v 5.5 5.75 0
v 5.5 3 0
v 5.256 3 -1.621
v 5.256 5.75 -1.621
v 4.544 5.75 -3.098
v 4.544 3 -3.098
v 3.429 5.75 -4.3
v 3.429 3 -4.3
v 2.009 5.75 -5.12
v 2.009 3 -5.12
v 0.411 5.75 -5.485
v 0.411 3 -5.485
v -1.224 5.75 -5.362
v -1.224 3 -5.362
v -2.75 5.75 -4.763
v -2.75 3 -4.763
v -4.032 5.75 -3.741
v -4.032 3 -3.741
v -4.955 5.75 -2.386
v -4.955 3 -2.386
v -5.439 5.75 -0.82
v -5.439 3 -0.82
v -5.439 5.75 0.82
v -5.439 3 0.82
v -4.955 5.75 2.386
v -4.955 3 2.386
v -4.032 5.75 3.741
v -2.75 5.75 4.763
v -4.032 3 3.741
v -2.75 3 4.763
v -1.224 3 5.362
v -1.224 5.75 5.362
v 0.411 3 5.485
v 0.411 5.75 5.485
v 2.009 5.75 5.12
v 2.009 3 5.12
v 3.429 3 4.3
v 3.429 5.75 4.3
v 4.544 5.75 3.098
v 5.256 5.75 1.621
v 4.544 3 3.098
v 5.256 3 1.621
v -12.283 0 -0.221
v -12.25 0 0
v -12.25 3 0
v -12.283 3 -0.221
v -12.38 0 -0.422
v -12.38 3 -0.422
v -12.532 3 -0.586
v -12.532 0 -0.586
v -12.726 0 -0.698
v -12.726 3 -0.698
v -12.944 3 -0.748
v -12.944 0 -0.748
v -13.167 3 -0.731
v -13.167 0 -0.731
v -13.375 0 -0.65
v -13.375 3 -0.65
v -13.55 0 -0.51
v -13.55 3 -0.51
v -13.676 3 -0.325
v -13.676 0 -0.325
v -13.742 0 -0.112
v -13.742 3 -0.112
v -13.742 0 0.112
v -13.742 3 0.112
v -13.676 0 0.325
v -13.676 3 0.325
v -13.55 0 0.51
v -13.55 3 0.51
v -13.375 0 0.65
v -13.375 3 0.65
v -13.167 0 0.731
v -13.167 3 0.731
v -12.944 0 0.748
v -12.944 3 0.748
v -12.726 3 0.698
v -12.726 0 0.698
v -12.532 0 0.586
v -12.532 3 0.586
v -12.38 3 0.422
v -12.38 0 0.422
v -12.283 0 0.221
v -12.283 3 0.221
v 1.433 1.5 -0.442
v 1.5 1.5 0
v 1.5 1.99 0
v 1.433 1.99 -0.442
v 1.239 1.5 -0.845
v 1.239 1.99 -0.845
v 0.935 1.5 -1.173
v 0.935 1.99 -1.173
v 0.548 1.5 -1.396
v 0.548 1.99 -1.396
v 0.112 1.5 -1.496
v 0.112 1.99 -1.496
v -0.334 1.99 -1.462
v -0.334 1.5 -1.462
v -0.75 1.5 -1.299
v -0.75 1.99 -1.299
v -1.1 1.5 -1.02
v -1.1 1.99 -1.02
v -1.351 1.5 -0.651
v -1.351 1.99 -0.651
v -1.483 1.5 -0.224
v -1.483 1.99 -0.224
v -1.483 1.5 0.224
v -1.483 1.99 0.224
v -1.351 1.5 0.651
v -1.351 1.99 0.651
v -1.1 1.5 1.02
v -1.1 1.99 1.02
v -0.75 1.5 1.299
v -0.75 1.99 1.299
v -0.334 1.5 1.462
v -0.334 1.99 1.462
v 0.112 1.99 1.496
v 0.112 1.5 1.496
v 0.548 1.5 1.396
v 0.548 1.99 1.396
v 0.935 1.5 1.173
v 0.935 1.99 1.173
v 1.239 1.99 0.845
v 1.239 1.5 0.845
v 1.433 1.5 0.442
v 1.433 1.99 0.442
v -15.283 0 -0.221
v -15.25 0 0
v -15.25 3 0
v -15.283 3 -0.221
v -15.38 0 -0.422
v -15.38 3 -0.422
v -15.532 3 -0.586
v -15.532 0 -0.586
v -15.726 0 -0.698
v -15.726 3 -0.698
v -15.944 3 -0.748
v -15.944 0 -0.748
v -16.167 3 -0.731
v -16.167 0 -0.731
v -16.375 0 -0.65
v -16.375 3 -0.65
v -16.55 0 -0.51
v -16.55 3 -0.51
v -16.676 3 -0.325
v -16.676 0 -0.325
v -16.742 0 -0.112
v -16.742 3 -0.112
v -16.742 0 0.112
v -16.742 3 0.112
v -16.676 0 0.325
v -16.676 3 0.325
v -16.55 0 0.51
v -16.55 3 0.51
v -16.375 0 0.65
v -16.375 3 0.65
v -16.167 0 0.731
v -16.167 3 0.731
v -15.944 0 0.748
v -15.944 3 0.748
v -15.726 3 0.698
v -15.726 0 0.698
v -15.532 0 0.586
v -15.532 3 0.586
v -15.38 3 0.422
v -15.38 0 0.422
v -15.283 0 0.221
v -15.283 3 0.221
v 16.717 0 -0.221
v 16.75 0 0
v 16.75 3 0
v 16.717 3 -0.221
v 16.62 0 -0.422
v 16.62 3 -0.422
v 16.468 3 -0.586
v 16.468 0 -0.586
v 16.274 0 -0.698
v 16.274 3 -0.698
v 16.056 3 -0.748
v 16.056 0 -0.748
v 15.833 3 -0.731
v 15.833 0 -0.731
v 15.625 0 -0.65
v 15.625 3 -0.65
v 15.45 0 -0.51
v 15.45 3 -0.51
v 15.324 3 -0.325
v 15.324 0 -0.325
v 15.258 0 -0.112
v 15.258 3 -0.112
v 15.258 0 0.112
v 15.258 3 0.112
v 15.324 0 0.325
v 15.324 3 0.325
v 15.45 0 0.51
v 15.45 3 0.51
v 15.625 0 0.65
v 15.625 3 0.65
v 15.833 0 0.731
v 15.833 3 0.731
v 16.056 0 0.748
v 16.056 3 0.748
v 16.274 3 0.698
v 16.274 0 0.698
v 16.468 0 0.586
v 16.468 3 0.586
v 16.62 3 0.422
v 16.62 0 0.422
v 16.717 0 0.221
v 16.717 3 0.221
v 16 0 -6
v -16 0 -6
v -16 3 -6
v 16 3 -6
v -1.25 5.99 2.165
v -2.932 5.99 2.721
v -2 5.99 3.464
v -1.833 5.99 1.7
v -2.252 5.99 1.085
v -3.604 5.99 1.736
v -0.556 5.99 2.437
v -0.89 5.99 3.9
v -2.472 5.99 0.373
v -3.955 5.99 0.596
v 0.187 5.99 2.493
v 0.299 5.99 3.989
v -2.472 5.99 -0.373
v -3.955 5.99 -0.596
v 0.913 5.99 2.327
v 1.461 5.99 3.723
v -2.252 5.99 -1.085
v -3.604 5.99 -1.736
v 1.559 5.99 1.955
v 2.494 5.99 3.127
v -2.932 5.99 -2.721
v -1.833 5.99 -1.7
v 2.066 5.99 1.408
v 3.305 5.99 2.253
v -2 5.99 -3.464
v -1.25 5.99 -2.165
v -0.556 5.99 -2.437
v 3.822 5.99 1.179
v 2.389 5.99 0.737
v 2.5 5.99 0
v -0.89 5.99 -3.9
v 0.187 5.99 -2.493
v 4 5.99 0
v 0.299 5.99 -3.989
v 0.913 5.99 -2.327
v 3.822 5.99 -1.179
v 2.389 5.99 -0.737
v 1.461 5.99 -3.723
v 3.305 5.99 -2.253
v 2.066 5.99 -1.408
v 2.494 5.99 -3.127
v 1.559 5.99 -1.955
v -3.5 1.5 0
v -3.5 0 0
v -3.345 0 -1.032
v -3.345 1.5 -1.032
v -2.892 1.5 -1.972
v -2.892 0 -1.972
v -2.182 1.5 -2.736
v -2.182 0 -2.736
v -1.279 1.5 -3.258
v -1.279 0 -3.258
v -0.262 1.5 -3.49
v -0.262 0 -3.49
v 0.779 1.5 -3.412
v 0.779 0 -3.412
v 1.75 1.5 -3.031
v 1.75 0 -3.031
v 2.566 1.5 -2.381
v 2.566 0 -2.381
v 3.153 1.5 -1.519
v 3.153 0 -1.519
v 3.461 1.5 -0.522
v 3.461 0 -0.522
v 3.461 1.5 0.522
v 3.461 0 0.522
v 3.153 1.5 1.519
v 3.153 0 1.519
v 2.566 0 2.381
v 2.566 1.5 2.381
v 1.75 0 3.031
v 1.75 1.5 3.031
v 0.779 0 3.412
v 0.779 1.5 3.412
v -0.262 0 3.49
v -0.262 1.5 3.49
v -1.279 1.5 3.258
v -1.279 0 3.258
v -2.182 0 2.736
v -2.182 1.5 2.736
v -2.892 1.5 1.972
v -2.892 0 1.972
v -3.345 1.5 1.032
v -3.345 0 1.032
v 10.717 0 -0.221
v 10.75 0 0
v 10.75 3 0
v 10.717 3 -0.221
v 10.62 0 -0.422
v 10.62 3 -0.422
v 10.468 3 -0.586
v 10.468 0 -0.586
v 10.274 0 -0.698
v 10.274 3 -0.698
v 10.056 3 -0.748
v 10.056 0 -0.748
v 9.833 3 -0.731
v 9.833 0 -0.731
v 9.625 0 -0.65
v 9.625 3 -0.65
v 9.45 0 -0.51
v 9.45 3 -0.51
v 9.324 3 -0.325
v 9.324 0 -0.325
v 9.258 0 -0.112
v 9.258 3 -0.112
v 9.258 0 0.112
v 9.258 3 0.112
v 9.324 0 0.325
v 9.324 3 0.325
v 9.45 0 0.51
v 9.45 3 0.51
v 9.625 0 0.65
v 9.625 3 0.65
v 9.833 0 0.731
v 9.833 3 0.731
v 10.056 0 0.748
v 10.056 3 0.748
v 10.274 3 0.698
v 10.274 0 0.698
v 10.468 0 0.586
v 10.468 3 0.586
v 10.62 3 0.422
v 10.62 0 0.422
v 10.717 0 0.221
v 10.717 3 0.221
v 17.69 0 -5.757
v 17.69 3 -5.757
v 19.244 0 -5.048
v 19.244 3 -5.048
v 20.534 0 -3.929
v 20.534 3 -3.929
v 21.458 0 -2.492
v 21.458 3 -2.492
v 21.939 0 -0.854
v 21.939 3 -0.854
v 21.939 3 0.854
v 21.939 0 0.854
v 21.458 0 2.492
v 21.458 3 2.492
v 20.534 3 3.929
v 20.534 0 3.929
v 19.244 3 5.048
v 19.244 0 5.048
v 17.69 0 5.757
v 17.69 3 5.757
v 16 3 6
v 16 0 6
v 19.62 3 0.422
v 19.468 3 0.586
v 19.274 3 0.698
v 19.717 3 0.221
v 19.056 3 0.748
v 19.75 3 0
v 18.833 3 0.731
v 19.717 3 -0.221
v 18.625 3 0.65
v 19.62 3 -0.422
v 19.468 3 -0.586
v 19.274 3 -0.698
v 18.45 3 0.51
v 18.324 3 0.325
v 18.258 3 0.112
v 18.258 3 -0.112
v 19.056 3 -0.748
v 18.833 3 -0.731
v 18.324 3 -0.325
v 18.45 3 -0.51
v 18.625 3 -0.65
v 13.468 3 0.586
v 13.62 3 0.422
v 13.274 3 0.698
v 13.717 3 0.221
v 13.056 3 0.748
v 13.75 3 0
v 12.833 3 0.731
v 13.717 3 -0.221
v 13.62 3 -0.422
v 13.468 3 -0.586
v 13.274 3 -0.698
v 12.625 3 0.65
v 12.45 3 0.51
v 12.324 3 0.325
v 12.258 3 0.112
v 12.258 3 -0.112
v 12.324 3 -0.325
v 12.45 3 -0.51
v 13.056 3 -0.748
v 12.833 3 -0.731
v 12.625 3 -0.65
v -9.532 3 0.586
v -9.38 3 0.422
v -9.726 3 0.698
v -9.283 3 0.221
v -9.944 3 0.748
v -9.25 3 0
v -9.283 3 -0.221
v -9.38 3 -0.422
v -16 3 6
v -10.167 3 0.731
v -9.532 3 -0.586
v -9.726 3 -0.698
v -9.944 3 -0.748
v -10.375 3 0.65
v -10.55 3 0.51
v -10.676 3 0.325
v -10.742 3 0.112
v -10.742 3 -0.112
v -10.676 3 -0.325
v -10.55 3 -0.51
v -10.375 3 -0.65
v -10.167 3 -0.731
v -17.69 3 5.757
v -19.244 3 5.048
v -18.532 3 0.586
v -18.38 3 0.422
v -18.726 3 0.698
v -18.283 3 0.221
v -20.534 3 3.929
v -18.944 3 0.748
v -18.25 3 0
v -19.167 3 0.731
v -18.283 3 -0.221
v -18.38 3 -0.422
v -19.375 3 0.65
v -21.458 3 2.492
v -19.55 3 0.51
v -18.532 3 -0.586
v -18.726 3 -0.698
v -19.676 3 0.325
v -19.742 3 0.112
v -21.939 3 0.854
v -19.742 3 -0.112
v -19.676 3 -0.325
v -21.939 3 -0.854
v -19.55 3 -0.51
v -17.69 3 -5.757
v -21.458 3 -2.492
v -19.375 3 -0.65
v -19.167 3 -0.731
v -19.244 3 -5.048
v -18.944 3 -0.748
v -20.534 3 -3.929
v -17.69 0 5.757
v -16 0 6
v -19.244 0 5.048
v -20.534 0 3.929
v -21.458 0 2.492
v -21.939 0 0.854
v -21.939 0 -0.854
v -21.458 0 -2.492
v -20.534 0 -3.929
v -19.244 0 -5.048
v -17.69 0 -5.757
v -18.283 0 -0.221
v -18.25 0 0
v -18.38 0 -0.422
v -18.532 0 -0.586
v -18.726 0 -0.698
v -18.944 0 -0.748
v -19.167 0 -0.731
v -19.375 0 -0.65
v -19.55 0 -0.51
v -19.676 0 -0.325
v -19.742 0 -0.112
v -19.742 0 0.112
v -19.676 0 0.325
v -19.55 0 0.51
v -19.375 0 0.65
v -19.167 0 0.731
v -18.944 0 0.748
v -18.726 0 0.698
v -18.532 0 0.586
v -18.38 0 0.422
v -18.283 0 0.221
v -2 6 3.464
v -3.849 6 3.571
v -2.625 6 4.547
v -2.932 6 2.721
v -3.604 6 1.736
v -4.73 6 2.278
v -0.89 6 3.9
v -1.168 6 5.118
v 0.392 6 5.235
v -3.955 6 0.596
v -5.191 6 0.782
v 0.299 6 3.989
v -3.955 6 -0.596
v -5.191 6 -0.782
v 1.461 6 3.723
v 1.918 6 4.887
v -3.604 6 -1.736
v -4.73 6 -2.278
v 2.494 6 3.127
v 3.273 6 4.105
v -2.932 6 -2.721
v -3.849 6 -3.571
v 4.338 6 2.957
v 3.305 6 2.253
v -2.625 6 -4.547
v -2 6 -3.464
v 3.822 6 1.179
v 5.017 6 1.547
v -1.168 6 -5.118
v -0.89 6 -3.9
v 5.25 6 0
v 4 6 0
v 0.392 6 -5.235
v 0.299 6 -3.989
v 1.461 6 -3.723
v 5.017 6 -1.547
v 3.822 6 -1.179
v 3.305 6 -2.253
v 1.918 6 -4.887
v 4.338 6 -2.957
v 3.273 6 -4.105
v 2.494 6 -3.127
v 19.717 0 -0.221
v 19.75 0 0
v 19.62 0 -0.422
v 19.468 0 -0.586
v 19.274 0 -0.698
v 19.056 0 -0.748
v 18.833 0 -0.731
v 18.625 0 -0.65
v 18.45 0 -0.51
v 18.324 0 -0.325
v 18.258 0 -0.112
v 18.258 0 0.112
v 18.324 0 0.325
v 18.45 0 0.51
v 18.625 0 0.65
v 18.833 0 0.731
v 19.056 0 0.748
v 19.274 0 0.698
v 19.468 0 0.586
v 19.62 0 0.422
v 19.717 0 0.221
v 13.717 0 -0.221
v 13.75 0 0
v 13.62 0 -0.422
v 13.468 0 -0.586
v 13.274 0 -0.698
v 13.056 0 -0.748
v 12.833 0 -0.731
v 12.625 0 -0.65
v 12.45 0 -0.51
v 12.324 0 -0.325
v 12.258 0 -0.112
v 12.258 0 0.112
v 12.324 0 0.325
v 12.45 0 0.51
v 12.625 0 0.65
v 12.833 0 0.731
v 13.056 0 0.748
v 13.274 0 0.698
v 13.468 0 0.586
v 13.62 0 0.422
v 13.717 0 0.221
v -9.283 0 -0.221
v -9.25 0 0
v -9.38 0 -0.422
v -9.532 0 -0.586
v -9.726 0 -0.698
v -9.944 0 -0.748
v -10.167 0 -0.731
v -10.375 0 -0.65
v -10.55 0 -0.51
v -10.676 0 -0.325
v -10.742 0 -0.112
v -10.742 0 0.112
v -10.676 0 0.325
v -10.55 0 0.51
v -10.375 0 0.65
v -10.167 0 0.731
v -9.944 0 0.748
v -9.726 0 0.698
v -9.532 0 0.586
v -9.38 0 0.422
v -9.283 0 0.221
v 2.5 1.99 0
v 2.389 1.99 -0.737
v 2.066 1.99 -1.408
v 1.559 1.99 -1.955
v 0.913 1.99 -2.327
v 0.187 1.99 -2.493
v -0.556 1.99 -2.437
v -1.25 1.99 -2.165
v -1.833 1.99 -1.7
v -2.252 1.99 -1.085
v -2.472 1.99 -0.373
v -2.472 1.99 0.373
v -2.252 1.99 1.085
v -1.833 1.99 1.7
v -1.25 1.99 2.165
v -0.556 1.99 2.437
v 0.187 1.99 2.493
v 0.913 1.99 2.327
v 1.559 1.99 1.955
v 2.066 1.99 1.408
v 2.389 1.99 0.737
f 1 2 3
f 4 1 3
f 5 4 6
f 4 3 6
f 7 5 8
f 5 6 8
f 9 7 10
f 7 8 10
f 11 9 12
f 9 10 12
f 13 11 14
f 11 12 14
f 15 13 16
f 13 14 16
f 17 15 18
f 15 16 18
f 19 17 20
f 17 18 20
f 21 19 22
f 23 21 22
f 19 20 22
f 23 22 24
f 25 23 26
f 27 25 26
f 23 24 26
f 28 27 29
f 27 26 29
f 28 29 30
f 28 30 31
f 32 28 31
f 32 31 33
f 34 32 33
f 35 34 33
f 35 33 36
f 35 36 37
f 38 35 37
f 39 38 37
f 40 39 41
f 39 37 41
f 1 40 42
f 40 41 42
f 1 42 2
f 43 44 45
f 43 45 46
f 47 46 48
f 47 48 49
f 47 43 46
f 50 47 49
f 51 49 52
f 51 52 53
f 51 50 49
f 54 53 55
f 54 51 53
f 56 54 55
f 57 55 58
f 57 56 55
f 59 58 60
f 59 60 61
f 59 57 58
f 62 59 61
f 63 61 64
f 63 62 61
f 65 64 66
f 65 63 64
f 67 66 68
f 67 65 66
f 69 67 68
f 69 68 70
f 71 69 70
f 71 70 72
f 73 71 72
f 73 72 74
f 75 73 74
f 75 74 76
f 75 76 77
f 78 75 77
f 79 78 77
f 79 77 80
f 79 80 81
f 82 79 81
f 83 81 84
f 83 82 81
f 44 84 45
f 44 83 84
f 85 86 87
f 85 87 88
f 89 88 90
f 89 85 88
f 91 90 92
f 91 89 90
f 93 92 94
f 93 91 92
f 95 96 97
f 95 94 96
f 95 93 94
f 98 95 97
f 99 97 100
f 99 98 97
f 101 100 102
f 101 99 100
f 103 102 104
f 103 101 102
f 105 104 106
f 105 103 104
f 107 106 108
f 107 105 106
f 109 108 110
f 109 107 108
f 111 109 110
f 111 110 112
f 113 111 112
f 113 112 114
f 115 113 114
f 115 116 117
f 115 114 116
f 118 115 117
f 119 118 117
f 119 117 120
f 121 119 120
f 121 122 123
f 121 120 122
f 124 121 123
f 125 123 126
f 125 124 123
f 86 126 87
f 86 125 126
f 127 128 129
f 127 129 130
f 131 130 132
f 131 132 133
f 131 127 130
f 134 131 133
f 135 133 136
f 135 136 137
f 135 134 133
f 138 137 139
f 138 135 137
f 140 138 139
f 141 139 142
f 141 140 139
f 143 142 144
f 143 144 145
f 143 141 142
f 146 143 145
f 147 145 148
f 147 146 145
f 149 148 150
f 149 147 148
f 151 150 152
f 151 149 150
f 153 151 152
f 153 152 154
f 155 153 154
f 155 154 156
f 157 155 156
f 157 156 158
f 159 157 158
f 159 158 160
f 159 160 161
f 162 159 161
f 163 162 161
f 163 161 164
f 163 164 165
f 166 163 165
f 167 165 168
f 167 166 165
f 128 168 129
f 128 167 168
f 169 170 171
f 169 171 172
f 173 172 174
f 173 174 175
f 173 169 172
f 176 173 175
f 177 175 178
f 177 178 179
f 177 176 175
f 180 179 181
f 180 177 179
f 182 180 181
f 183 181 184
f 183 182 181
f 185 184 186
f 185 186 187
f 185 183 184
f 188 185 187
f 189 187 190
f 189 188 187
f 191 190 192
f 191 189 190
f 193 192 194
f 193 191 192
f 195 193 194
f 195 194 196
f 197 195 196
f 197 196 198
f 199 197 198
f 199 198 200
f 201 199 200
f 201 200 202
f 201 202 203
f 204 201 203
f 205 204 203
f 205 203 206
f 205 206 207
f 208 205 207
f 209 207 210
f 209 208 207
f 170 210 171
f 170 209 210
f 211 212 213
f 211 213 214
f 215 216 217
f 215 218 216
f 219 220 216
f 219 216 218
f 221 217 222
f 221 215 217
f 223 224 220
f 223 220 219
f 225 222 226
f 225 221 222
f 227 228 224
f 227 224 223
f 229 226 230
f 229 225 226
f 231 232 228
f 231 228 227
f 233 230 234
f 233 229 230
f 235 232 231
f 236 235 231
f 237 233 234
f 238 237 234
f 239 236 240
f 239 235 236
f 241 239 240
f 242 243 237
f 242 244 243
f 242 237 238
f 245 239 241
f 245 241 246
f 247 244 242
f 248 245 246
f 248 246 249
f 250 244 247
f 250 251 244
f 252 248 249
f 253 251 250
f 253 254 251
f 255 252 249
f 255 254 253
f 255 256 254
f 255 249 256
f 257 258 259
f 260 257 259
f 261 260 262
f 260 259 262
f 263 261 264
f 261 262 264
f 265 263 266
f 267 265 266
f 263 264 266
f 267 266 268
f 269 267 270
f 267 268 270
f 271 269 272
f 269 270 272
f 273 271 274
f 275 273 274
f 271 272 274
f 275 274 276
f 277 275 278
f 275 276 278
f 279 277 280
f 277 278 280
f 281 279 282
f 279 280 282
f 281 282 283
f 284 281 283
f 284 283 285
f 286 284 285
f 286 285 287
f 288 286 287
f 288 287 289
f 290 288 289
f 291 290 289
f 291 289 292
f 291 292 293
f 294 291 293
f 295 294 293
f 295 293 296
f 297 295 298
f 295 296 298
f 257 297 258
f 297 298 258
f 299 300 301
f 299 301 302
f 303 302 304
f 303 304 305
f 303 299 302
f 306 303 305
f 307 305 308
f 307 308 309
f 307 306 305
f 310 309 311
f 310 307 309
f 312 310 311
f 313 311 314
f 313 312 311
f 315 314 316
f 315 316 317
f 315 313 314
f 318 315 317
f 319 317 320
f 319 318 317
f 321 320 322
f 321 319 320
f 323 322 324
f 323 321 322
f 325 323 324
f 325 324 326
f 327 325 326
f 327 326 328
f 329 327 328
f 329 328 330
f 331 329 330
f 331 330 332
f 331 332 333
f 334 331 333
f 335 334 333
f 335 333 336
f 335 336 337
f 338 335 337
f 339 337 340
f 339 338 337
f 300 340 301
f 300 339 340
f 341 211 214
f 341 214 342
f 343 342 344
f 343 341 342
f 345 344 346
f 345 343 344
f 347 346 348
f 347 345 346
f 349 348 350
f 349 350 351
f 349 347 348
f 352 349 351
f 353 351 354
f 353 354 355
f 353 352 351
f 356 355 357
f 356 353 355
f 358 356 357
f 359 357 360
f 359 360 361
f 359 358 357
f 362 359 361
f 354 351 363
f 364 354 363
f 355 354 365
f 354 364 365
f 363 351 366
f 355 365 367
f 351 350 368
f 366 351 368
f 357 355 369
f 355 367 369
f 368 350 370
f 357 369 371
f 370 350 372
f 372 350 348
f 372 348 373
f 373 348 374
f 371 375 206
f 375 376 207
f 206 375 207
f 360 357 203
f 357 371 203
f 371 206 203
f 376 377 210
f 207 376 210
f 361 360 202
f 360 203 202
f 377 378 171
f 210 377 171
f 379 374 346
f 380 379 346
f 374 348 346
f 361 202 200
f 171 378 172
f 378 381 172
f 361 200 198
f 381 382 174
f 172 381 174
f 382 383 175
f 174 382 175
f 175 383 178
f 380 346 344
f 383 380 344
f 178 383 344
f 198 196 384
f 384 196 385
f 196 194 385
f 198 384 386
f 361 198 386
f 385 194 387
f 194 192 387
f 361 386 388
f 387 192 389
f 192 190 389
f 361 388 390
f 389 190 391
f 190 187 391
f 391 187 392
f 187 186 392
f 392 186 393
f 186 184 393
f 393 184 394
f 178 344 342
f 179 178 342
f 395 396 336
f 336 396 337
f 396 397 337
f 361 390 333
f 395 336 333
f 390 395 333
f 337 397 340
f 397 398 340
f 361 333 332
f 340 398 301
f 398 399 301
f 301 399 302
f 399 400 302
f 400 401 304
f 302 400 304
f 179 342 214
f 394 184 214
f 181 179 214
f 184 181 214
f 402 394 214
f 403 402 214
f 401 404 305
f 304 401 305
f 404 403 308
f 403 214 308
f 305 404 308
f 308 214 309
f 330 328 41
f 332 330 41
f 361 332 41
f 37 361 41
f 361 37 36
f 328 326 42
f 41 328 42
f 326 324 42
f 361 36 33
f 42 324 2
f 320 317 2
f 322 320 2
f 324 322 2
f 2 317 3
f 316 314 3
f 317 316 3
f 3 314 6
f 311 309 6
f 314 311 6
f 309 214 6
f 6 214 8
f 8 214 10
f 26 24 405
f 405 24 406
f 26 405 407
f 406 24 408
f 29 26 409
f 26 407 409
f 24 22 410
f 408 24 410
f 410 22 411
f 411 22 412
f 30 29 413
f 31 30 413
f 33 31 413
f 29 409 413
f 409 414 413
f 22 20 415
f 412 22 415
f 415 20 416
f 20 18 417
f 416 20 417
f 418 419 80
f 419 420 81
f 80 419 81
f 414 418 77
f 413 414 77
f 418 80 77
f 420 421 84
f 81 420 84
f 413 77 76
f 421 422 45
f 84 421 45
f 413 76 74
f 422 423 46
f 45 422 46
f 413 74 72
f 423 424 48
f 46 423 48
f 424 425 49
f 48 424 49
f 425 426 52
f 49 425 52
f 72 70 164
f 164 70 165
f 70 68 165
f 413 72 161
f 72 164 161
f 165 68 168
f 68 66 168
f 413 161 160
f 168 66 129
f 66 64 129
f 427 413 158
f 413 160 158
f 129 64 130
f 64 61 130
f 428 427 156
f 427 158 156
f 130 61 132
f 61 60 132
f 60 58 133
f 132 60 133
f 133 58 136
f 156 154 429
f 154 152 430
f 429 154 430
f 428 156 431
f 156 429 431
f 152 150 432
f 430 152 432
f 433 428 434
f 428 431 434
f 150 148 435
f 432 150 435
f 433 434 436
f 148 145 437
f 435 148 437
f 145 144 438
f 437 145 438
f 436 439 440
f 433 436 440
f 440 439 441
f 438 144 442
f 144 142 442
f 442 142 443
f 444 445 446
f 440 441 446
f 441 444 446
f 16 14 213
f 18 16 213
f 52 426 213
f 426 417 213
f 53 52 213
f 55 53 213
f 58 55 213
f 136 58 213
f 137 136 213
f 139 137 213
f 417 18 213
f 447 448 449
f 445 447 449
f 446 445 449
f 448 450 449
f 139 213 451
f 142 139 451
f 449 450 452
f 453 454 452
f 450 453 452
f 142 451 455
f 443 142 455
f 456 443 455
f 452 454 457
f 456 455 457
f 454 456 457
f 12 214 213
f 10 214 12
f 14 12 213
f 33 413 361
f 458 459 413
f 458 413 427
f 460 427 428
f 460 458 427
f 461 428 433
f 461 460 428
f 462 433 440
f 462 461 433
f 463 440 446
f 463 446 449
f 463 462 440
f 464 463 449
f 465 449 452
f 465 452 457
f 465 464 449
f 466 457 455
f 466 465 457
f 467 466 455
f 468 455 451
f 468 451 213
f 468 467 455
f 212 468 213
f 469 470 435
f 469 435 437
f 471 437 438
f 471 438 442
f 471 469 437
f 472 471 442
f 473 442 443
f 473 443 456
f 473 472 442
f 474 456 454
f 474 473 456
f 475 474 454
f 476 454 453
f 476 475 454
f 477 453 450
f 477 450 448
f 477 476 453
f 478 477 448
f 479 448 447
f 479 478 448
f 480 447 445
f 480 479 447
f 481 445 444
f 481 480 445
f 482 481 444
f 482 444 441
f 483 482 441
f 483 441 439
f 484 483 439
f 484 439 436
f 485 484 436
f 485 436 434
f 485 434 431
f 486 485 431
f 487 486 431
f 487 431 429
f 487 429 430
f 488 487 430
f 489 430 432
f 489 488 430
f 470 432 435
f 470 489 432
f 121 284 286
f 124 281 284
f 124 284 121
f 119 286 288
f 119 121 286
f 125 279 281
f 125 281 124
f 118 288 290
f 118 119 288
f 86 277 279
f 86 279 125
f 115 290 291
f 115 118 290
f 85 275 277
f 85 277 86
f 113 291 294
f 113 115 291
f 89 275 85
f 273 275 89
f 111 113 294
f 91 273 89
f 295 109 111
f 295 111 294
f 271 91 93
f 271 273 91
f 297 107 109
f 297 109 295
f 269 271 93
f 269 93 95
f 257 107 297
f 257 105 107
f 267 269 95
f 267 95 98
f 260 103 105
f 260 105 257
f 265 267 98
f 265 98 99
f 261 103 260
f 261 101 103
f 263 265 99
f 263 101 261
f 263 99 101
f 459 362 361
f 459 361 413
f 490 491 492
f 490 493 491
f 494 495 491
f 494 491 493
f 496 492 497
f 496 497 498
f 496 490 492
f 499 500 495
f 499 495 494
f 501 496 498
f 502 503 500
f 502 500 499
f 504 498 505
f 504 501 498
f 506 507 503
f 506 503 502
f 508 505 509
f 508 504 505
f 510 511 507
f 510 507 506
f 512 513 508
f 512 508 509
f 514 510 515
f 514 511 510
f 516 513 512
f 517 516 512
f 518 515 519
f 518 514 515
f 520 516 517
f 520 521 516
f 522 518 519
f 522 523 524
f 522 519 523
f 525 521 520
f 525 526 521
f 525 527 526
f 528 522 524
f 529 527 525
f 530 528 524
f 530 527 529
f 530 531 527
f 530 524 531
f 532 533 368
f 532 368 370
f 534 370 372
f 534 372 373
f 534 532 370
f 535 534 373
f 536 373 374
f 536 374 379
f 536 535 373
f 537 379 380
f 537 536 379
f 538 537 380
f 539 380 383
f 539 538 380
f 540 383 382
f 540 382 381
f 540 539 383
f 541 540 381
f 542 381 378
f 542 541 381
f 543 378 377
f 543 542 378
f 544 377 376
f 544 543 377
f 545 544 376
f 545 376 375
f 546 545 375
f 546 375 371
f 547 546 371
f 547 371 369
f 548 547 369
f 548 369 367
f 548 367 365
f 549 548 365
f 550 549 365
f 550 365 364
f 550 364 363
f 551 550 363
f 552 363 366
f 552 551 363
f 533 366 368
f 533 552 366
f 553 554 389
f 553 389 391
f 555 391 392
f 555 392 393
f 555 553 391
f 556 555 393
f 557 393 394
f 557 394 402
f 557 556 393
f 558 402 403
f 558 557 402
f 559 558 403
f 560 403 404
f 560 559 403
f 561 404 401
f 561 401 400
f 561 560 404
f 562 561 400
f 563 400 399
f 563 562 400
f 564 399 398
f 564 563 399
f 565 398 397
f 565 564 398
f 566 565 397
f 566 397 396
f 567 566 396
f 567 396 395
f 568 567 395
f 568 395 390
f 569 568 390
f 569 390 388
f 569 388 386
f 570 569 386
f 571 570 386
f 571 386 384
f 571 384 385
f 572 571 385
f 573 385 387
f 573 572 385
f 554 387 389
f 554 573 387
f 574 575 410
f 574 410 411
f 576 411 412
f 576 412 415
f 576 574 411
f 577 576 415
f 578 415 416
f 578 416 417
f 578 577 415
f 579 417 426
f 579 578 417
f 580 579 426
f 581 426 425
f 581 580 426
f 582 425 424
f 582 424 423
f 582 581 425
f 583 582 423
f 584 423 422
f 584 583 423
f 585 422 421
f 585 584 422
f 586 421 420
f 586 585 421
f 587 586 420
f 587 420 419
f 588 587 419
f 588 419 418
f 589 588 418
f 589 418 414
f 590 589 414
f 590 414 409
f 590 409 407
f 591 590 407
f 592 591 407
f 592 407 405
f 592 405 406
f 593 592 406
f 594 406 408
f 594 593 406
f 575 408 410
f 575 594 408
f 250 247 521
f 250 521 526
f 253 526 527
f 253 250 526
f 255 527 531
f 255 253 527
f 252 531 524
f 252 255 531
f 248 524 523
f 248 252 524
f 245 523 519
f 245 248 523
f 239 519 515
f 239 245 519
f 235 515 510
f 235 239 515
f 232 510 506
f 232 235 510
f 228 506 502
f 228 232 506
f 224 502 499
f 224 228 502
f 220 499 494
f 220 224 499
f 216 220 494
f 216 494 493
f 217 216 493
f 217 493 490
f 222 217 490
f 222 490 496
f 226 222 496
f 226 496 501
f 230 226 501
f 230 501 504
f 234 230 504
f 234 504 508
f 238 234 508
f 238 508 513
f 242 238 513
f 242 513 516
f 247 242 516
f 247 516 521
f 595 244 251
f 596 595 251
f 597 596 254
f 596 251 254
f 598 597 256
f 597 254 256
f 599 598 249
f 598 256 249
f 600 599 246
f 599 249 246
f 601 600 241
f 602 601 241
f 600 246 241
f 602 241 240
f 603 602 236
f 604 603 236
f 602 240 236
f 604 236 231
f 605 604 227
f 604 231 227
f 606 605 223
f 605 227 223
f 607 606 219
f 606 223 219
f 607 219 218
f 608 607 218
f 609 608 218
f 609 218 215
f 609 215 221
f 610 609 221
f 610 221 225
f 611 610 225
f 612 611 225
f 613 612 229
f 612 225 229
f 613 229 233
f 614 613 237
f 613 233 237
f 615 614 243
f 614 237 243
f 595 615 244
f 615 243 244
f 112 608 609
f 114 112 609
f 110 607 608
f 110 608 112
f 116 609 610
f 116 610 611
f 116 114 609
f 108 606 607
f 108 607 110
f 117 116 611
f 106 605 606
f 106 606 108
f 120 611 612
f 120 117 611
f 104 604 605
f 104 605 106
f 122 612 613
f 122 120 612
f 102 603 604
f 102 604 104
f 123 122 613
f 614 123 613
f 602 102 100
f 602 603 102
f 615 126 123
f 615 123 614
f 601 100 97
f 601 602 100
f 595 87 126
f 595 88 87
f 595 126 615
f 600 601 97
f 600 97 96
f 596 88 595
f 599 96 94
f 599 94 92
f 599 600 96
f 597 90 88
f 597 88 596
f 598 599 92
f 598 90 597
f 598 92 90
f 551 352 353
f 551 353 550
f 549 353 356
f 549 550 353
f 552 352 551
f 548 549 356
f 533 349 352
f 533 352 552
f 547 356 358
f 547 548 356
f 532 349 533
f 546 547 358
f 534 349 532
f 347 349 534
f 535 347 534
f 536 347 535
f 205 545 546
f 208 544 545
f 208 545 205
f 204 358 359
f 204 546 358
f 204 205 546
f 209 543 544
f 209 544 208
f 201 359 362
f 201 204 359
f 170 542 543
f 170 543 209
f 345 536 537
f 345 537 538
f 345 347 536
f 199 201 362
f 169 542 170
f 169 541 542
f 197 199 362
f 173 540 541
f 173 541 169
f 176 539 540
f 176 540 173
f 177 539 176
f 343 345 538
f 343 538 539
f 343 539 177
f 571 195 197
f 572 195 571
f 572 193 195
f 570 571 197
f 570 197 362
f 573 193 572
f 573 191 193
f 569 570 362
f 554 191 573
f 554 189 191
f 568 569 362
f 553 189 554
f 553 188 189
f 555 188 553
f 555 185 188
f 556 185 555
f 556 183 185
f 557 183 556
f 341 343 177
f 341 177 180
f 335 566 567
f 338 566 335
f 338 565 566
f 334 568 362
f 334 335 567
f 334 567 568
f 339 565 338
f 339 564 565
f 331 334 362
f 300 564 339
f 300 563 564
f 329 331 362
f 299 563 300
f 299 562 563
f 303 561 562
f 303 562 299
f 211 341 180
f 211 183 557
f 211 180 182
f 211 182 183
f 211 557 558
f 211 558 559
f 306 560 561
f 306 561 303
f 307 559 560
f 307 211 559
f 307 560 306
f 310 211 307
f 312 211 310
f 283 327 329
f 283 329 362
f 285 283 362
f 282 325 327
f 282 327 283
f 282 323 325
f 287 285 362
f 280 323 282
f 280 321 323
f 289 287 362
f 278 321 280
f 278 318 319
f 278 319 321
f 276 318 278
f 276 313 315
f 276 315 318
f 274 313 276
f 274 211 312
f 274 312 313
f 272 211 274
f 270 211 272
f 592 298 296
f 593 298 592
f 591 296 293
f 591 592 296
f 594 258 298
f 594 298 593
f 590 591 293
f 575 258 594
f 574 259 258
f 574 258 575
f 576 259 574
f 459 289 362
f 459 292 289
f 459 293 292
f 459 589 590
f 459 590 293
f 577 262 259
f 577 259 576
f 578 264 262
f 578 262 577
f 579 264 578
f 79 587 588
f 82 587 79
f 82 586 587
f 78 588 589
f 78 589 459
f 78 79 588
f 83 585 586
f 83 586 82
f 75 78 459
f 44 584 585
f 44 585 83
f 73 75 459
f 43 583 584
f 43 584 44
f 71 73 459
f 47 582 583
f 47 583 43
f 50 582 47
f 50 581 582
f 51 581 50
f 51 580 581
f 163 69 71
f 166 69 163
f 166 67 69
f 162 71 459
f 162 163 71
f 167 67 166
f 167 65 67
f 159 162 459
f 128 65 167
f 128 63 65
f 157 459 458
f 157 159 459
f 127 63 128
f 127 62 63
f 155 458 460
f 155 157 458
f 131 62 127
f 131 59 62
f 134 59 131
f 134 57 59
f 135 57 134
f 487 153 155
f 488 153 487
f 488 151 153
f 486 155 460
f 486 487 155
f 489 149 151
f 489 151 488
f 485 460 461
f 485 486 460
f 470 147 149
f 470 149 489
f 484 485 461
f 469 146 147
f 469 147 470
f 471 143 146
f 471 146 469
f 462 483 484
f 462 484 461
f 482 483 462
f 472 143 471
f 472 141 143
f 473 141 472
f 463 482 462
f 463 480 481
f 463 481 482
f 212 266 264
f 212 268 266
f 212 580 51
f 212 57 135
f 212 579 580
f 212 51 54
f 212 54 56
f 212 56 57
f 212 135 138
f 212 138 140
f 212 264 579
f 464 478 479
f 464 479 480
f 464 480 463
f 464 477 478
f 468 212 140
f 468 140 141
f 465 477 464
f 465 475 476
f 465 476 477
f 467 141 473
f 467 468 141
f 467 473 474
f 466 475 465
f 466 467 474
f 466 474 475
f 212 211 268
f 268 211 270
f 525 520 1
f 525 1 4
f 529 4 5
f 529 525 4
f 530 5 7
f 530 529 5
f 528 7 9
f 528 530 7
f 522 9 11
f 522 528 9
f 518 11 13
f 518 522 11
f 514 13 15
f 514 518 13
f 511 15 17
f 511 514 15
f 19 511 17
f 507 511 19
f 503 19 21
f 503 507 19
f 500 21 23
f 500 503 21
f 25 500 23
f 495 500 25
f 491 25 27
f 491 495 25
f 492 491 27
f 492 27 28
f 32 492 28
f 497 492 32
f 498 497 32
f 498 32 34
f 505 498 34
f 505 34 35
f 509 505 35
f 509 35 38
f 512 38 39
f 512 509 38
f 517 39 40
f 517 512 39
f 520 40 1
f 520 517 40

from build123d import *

# Parameters (mm, degrees)
SKETCH1_R           = 0.75
SKETCH1_R_2         = 1.5
BOSS_EXTRUDE1_DEPTH = 3
SKETCH2_R           = 3.5
CUT_EXTRUDE1_DEPTH  = 1.5
SKETCH3_R           = 4
BOSS_EXTRUDE2_DEPTH = 2.99
SKETCH4_R           = 2.5
CUT_EXTRUDE2_DEPTH  = 4
SKETCH5_R           = 5.5
SKETCH5_R_2         = 4
BOSS_EXTRUDE3_DEPTH = 3
CHAMFER1_SIZE       = 0.25


with BuildPart() as part:
    # Sketch1 → Boss-Extrude1 (new body)
    with BuildSketch(Plane(origin=(0, 0, 0), x_dir=(1, 0, 0), z_dir=(0, 1, 0))):
        with BuildLine():
            Line((-16, 6), (16, 6))
            ThreePointArc((16, 6), (22, 0), (16, -6))
            Line((16, -6), (-16, -6))
            ThreePointArc((-16, -6), (-22, 0), (-16, 6))
        make_face()
        with Locations((10, 0)):
            Circle(SKETCH1_R, mode=Mode.SUBTRACT)
        with Locations((13, 0)):
            Circle(SKETCH1_R, mode=Mode.SUBTRACT)
        with Locations((16, 0)):
            Circle(SKETCH1_R, mode=Mode.SUBTRACT)
        with Locations((19, 0)):
            Circle(SKETCH1_R, mode=Mode.SUBTRACT)
        with Locations((-19, 0)):
            Circle(SKETCH1_R, mode=Mode.SUBTRACT)
        with Locations((-16, 0)):
            Circle(SKETCH1_R, mode=Mode.SUBTRACT)
        with Locations((-13, 0)):
            Circle(SKETCH1_R, mode=Mode.SUBTRACT)
        with Locations((-10, 0)):
            Circle(SKETCH1_R, mode=Mode.SUBTRACT)
        Circle(SKETCH1_R_2, mode=Mode.SUBTRACT)
    extrude(amount=BOSS_EXTRUDE1_DEPTH)

    # Sketch2 → Cut-Extrude1 (cut)
    with BuildSketch(Plane(origin=(0, 0, 0), x_dir=(-1, 0, 0), z_dir=(0, -1, 0))):
        Circle(SKETCH2_R)
    extrude(amount=-CUT_EXTRUDE1_DEPTH, mode=Mode.SUBTRACT)

    # Sketch3 → Boss-Extrude2 (add)
    with BuildSketch(Plane(origin=(0, 3, 0), x_dir=(1, 0, 0), z_dir=(0, 1, 0))):
        Circle(SKETCH3_R)
    extrude(amount=BOSS_EXTRUDE2_DEPTH)

    # Sketch4 → Cut-Extrude2 (cut)
    with BuildSketch(Plane(origin=(0, 5.99, 0), x_dir=(1, 0, 0), z_dir=(0, 1, 0))):
        Circle(SKETCH4_R)
    extrude(amount=-CUT_EXTRUDE2_DEPTH, mode=Mode.SUBTRACT)

    # Sketch5 → Boss-Extrude3 (add)
    with BuildSketch(Plane(origin=(0, 3, 0), x_dir=(1, 0, 0), z_dir=(0, 1, 0))):
        Circle(SKETCH5_R)
        Circle(SKETCH5_R_2, mode=Mode.SUBTRACT)
    extrude(amount=BOSS_EXTRUDE3_DEPTH)

    # Chamfer1
    chamfer1_edges = [part.edges().sort_by_distance(p)[0] for p in [
        (-5.5, 6, 0),
    ]]
    chamfer(chamfer1_edges, length=CHAMFER1_SIZE)


solid = part.part
